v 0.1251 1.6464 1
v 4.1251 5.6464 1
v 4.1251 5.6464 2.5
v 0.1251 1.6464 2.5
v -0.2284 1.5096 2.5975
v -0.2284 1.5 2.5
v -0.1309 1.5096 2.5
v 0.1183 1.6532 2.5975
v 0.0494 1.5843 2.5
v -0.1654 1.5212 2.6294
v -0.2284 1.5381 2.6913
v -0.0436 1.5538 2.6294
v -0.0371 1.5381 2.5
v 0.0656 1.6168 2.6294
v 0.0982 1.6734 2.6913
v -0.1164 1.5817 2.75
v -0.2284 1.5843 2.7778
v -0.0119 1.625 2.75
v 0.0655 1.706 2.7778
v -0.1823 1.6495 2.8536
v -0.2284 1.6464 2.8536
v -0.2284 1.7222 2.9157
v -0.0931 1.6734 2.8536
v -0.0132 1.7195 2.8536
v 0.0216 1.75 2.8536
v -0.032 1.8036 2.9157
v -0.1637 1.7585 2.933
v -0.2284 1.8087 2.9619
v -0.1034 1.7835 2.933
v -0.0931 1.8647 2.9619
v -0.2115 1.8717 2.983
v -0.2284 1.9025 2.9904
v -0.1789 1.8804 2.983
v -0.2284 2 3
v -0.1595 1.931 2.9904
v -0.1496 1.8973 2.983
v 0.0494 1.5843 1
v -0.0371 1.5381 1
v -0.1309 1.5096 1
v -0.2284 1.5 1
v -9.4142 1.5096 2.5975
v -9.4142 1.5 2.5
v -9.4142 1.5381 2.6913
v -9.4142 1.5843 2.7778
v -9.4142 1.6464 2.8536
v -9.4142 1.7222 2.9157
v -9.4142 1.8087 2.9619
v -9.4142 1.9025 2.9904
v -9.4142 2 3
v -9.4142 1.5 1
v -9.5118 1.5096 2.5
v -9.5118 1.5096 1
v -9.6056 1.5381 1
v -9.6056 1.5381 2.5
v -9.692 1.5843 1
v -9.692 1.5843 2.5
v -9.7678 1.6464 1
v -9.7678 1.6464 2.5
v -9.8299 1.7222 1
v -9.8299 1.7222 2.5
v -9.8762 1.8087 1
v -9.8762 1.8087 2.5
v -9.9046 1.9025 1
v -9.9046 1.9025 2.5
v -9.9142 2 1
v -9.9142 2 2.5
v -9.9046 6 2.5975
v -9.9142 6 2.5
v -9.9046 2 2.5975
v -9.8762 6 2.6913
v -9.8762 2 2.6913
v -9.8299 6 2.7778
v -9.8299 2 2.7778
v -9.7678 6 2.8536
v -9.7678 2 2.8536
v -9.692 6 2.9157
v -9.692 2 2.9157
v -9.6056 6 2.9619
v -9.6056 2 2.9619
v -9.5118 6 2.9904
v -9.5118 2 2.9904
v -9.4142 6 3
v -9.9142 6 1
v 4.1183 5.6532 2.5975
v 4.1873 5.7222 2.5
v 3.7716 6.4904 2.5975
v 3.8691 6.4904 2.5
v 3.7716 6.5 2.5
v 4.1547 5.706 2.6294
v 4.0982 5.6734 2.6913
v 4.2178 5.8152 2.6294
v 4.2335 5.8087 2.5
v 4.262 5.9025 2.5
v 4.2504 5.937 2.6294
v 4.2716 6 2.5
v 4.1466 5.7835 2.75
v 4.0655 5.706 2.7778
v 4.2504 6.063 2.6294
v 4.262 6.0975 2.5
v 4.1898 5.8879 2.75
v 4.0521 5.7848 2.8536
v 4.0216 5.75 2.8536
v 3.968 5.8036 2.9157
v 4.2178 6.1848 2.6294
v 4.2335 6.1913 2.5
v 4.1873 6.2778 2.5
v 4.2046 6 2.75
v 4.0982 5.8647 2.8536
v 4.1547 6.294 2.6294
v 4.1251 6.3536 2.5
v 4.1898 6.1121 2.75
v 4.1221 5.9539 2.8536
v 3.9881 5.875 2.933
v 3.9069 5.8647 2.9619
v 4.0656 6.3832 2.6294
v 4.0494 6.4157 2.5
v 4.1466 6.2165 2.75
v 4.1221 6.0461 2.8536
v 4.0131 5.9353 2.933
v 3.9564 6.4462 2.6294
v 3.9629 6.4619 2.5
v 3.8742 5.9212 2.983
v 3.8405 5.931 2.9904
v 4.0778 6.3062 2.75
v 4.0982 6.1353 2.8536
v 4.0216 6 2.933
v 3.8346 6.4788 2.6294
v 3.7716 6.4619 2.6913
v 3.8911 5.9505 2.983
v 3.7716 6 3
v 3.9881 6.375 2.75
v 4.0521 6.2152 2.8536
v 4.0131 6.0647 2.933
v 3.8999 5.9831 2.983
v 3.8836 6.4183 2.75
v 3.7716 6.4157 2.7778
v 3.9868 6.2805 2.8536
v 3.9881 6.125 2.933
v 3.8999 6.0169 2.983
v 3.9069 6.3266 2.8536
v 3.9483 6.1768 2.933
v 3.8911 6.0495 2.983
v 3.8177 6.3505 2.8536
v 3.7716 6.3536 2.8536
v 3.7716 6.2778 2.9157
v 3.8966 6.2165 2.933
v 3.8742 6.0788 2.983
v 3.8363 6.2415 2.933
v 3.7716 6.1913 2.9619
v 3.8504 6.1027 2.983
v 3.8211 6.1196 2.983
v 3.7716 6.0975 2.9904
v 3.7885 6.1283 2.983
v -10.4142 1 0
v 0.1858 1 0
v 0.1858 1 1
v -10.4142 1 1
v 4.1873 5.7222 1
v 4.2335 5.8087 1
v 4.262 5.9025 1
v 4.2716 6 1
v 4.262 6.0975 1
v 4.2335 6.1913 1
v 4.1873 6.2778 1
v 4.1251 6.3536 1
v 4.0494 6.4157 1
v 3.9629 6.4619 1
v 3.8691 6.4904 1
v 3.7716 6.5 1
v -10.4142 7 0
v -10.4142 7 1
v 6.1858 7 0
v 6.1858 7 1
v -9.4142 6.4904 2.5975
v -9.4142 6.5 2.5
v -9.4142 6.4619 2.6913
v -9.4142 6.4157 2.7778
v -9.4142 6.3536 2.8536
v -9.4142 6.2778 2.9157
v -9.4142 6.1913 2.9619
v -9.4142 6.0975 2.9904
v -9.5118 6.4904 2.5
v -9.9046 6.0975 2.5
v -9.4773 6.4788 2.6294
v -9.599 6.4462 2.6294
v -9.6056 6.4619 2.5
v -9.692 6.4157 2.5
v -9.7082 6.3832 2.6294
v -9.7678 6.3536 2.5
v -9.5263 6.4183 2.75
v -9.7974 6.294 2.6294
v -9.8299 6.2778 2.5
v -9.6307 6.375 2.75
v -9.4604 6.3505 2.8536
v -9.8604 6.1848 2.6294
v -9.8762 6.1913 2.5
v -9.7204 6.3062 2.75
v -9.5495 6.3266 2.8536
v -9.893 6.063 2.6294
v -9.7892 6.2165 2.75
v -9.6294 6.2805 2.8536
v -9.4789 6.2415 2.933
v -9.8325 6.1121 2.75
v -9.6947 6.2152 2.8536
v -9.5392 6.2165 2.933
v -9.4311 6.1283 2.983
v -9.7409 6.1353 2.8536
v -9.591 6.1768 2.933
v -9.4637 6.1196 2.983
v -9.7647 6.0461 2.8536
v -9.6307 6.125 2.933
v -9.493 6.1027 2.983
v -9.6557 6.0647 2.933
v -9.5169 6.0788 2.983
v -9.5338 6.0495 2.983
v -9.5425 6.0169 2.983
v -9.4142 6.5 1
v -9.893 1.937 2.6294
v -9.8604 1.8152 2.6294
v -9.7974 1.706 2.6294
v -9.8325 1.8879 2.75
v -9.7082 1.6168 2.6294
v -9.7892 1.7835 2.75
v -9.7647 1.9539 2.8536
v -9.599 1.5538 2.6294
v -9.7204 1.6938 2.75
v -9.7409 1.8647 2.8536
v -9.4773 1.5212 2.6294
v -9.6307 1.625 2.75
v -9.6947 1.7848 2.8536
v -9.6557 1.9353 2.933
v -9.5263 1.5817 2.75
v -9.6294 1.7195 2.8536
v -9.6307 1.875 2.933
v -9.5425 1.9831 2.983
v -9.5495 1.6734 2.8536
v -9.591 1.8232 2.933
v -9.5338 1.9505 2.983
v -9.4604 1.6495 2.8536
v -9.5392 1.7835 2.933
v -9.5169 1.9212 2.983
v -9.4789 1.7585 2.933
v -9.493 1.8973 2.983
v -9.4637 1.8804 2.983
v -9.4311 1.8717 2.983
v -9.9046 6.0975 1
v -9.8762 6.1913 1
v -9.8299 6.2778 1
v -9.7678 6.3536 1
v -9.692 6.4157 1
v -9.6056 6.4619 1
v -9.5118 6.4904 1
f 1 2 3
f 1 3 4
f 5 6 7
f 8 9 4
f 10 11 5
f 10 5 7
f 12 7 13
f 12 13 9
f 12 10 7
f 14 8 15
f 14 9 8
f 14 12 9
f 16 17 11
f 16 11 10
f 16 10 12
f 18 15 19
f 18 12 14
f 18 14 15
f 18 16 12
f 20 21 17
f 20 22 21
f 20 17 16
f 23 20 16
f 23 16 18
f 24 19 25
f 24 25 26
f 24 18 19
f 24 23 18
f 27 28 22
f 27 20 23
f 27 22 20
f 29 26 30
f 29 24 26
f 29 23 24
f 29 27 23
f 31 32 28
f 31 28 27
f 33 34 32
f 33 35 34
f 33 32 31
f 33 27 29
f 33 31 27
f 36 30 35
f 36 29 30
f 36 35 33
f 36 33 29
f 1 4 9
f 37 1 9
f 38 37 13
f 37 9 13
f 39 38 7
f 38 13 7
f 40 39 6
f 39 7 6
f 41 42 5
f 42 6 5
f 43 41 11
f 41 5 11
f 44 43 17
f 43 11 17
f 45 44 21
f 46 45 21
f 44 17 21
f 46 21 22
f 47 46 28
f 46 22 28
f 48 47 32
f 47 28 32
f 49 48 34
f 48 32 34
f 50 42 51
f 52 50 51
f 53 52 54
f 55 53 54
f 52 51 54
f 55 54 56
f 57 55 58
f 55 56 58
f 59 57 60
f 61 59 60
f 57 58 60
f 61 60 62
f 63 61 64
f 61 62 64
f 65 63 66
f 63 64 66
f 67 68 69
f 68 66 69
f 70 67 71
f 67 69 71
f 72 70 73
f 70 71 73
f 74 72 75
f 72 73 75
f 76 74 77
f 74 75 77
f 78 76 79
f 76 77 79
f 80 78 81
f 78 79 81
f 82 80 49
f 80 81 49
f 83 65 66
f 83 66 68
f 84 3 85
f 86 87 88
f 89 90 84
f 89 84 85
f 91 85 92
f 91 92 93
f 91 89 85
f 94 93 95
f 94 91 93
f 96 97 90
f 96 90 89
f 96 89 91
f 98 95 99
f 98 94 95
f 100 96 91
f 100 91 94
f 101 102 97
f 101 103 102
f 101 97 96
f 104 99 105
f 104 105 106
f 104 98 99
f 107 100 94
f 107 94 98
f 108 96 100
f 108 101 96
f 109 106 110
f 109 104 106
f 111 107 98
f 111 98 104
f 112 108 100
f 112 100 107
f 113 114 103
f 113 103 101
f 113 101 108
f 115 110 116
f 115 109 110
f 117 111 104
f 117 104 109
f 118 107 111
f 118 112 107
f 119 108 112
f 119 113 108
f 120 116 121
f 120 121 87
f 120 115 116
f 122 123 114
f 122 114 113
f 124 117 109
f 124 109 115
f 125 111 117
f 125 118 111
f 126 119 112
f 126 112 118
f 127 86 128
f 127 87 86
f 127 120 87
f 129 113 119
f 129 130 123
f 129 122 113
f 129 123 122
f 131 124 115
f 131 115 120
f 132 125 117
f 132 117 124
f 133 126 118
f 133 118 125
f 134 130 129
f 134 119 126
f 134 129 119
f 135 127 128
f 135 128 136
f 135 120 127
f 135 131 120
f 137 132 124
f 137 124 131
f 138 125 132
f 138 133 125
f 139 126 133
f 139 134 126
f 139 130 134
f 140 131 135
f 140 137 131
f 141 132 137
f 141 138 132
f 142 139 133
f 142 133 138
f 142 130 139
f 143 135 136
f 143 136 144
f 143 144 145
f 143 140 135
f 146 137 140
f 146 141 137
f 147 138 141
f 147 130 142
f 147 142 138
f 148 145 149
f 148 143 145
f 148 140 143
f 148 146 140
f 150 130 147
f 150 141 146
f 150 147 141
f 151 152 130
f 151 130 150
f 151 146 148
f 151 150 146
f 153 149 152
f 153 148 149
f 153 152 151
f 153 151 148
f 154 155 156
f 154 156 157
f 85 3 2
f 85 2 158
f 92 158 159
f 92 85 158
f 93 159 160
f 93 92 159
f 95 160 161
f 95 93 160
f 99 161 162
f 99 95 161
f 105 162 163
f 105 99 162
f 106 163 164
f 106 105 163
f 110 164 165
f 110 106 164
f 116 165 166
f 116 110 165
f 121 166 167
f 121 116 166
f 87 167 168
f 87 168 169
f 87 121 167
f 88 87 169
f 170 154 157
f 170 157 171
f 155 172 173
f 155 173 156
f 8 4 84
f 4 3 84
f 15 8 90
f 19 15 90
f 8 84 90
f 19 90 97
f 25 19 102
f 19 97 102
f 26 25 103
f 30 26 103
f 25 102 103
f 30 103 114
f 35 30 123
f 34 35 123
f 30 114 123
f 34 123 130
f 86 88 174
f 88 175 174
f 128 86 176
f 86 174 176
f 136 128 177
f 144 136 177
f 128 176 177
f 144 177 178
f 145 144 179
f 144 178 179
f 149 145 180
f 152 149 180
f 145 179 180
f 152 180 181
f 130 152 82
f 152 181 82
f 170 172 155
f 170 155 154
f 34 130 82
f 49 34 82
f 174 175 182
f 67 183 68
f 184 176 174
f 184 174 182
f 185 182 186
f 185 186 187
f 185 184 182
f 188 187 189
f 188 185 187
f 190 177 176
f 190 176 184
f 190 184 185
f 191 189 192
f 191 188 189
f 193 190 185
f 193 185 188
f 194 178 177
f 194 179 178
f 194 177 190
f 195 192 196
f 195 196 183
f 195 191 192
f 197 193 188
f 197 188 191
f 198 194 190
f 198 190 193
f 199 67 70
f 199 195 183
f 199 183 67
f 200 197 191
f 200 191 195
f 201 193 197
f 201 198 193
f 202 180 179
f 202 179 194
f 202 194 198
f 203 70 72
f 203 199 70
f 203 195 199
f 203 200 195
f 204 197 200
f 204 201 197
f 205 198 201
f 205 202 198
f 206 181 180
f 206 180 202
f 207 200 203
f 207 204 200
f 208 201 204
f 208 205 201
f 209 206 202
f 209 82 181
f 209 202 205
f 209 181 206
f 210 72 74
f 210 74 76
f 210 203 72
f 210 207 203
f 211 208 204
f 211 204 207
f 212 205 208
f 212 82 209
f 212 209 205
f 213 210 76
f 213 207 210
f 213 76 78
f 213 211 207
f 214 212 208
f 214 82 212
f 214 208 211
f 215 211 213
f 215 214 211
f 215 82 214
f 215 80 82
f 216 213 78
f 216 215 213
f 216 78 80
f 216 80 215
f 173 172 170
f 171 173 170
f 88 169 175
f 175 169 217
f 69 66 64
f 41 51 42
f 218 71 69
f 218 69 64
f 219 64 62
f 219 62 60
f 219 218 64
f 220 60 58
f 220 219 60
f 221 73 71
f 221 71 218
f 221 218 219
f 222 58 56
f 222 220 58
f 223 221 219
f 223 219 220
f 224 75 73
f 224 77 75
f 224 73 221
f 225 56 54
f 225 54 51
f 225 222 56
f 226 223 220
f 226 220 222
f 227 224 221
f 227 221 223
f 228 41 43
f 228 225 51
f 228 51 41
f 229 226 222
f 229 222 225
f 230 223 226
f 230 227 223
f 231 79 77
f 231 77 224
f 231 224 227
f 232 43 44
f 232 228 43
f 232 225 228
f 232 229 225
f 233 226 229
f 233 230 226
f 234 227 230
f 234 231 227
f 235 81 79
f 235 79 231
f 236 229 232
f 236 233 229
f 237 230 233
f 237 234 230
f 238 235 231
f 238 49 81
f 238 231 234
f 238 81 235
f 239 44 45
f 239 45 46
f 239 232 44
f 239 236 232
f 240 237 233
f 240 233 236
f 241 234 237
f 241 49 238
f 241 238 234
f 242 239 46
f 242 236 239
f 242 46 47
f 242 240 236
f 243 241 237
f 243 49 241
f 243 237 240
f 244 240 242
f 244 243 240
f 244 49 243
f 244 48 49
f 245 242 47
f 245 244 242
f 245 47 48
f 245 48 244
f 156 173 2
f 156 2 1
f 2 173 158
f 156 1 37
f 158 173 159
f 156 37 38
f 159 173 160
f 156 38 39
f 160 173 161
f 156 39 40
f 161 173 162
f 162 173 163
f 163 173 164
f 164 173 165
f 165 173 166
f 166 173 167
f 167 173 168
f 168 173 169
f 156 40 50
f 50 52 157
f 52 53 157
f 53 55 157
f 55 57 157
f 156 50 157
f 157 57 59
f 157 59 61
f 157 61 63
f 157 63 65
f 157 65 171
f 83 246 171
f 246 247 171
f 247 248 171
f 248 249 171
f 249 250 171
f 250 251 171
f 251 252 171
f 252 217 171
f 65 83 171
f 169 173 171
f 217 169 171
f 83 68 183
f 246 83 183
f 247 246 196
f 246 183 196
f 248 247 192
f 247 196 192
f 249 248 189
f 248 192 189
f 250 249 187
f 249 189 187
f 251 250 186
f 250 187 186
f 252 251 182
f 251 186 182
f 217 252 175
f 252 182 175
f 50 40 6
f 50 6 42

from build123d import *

# Parameters (mm, degrees)
BOSS_EXTRUDE1_DEPTH = 1
BOSS_EXTRUDE2_DEPTH = 2
FILLET1_R           = 0.5
FILLET2_R           = 0.5


with BuildPart() as part:
    # Sketch1 → Boss-Extrude1 (new body)
    with BuildSketch(Plane.XY):
        Polygon((0.185786438, 7), (6.185786438, 7), (0.185786438, 1), (-10.414213562, 1), (-10.414213562, 7), align=None)
    extrude(amount=BOSS_EXTRUDE1_DEPTH)

    # Sketch3 → Boss-Extrude2 (add)
    with BuildSketch(Plane.XY.offset(1)):
        Polygon((-0.621320344, 6.5), (4.978679656, 6.5), (-0.021320344, 1.5), (-9.914213562, 1.5), (-9.914213562, 6.5), align=None)
    extrude(amount=BOSS_EXTRUDE2_DEPTH)

    # Fillet1
    fillet1_edges = [part.edges().sort_by_distance(p)[0] for p in [
        (-9.914213562, 6.5, 2),
        (-9.914213562, 1.5, 2),
        (-0.021320344, 1.5, 2),
        (4.978679656, 6.5, 2),
    ]]
    fillet(fillet1_edges, radius=FILLET1_R)

    # Fillet2
    fillet2_edges = [part.edges().sort_by_distance(p)[0] for p in [
        (-2.821320344, 6.5, 3),
        (2.125126266, 3.646446609, 3),
        (-9.914213562, 4, 3),
        (-4.821320344, 1.5, 3),
        (-0.037085409, 1.538060234, 3),
        (-9.767766953, 1.646446609, 3),
        (-9.767766953, 6.353553391, 3),
        (4.233512642, 6.191341716, 3),
    ]]
    fillet(fillet2_edges, radius=FILLET2_R)


solid = part.part
